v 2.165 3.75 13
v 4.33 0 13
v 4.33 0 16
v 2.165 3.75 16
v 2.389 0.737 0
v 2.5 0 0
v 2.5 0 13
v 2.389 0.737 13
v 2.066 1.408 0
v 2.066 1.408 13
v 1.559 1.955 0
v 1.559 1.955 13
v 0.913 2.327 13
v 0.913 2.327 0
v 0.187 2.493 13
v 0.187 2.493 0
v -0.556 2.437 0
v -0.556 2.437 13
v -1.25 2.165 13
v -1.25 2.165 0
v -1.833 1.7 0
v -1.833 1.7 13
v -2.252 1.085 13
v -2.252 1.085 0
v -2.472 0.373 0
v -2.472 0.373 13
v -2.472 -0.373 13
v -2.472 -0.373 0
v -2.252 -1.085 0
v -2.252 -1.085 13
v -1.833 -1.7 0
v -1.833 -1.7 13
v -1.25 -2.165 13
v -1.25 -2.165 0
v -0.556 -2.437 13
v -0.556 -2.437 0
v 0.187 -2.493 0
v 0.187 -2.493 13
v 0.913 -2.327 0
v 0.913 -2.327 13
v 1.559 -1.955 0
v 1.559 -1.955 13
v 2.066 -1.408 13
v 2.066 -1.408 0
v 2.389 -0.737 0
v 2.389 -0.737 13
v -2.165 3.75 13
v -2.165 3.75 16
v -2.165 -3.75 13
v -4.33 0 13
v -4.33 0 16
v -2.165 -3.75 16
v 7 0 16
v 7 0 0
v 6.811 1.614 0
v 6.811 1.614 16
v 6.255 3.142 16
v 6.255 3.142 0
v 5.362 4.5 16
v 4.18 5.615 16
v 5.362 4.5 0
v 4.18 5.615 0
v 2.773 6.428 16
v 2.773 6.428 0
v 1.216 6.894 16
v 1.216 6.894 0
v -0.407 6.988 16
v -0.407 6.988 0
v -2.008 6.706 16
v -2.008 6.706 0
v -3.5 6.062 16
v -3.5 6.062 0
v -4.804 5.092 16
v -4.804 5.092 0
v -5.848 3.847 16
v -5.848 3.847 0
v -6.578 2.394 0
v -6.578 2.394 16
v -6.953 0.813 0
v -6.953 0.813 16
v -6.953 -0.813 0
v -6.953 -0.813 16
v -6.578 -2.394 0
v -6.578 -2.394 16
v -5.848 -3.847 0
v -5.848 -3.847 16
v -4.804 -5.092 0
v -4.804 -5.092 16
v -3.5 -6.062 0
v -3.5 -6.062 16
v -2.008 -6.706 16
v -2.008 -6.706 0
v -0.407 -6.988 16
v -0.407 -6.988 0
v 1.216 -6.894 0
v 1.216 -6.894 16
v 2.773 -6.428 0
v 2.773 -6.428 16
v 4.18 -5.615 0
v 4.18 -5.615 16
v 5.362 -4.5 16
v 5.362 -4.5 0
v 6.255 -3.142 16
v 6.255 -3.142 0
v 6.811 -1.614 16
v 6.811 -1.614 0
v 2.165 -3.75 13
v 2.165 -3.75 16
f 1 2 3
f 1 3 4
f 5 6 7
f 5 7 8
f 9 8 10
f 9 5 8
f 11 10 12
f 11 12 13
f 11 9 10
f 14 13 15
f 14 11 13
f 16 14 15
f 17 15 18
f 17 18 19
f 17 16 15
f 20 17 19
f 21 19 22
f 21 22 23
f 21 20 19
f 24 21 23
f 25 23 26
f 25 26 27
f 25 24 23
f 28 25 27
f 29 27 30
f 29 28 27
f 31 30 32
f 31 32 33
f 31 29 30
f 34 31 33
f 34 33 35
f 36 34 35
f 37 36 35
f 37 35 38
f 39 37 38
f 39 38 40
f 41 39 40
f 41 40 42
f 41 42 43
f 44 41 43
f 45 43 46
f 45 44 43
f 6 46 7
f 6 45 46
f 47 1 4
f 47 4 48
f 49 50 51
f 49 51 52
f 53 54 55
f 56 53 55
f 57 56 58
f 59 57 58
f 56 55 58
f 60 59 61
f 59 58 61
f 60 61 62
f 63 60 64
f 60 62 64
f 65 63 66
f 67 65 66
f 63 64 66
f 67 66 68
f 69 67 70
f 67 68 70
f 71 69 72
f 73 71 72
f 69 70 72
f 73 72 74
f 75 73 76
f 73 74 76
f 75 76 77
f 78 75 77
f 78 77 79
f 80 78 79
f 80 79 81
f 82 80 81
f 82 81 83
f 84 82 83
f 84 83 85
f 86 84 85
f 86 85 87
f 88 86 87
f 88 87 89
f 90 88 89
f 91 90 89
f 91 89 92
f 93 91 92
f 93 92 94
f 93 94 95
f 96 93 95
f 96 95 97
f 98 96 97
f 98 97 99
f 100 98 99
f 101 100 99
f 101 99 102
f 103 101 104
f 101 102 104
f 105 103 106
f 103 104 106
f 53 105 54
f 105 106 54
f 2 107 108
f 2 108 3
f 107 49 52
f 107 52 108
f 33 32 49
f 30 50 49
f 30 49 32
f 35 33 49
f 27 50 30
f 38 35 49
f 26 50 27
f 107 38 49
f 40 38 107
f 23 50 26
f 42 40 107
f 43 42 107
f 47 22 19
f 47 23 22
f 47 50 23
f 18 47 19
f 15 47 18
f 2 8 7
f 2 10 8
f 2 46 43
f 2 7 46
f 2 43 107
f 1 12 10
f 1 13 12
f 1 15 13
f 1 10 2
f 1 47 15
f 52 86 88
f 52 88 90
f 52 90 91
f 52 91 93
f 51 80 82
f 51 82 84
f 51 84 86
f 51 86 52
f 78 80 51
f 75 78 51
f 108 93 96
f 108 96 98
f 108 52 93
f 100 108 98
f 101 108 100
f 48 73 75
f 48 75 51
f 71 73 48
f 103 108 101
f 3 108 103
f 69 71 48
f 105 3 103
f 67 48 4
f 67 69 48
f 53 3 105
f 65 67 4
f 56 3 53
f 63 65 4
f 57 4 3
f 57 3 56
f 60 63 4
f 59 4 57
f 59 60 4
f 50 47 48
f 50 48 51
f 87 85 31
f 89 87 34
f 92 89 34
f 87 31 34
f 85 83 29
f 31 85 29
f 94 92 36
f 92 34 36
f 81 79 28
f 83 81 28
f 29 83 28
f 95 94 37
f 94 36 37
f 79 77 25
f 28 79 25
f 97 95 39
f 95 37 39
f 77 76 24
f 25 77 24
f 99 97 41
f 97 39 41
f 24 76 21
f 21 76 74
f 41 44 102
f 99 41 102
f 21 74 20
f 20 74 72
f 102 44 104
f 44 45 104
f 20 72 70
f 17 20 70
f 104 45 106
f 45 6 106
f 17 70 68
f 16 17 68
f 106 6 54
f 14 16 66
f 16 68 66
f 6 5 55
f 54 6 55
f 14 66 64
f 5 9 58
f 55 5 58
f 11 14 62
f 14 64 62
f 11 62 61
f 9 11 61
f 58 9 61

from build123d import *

# Parameters (mm, degrees)
SKETCH_R      = 7
PAD_DEPTH     = 16
SKETCH001_R   = 7
SKETCH001_R_2 = 2.5
PAD001_DEPTH  = 13


with BuildPart() as part:
    # Sketch → Pad (new body)
    with BuildSketch(Plane.XY):
        Circle(SKETCH_R)
        Polygon((4.330127, 0), (2.165064, 3.75), (-2.165064, 3.75), (-4.330127, 0), (-2.165064, -3.75), (2.165064, -3.75), align=None, mode=Mode.SUBTRACT)
    extrude(amount=PAD_DEPTH)

    # Sketch001 → Pad001 (join)
    with BuildSketch(Plane.XY):
        Circle(SKETCH001_R)
        Circle(SKETCH001_R_2, mode=Mode.SUBTRACT)
    extrude(amount=PAD001_DEPTH)


solid = part.part
